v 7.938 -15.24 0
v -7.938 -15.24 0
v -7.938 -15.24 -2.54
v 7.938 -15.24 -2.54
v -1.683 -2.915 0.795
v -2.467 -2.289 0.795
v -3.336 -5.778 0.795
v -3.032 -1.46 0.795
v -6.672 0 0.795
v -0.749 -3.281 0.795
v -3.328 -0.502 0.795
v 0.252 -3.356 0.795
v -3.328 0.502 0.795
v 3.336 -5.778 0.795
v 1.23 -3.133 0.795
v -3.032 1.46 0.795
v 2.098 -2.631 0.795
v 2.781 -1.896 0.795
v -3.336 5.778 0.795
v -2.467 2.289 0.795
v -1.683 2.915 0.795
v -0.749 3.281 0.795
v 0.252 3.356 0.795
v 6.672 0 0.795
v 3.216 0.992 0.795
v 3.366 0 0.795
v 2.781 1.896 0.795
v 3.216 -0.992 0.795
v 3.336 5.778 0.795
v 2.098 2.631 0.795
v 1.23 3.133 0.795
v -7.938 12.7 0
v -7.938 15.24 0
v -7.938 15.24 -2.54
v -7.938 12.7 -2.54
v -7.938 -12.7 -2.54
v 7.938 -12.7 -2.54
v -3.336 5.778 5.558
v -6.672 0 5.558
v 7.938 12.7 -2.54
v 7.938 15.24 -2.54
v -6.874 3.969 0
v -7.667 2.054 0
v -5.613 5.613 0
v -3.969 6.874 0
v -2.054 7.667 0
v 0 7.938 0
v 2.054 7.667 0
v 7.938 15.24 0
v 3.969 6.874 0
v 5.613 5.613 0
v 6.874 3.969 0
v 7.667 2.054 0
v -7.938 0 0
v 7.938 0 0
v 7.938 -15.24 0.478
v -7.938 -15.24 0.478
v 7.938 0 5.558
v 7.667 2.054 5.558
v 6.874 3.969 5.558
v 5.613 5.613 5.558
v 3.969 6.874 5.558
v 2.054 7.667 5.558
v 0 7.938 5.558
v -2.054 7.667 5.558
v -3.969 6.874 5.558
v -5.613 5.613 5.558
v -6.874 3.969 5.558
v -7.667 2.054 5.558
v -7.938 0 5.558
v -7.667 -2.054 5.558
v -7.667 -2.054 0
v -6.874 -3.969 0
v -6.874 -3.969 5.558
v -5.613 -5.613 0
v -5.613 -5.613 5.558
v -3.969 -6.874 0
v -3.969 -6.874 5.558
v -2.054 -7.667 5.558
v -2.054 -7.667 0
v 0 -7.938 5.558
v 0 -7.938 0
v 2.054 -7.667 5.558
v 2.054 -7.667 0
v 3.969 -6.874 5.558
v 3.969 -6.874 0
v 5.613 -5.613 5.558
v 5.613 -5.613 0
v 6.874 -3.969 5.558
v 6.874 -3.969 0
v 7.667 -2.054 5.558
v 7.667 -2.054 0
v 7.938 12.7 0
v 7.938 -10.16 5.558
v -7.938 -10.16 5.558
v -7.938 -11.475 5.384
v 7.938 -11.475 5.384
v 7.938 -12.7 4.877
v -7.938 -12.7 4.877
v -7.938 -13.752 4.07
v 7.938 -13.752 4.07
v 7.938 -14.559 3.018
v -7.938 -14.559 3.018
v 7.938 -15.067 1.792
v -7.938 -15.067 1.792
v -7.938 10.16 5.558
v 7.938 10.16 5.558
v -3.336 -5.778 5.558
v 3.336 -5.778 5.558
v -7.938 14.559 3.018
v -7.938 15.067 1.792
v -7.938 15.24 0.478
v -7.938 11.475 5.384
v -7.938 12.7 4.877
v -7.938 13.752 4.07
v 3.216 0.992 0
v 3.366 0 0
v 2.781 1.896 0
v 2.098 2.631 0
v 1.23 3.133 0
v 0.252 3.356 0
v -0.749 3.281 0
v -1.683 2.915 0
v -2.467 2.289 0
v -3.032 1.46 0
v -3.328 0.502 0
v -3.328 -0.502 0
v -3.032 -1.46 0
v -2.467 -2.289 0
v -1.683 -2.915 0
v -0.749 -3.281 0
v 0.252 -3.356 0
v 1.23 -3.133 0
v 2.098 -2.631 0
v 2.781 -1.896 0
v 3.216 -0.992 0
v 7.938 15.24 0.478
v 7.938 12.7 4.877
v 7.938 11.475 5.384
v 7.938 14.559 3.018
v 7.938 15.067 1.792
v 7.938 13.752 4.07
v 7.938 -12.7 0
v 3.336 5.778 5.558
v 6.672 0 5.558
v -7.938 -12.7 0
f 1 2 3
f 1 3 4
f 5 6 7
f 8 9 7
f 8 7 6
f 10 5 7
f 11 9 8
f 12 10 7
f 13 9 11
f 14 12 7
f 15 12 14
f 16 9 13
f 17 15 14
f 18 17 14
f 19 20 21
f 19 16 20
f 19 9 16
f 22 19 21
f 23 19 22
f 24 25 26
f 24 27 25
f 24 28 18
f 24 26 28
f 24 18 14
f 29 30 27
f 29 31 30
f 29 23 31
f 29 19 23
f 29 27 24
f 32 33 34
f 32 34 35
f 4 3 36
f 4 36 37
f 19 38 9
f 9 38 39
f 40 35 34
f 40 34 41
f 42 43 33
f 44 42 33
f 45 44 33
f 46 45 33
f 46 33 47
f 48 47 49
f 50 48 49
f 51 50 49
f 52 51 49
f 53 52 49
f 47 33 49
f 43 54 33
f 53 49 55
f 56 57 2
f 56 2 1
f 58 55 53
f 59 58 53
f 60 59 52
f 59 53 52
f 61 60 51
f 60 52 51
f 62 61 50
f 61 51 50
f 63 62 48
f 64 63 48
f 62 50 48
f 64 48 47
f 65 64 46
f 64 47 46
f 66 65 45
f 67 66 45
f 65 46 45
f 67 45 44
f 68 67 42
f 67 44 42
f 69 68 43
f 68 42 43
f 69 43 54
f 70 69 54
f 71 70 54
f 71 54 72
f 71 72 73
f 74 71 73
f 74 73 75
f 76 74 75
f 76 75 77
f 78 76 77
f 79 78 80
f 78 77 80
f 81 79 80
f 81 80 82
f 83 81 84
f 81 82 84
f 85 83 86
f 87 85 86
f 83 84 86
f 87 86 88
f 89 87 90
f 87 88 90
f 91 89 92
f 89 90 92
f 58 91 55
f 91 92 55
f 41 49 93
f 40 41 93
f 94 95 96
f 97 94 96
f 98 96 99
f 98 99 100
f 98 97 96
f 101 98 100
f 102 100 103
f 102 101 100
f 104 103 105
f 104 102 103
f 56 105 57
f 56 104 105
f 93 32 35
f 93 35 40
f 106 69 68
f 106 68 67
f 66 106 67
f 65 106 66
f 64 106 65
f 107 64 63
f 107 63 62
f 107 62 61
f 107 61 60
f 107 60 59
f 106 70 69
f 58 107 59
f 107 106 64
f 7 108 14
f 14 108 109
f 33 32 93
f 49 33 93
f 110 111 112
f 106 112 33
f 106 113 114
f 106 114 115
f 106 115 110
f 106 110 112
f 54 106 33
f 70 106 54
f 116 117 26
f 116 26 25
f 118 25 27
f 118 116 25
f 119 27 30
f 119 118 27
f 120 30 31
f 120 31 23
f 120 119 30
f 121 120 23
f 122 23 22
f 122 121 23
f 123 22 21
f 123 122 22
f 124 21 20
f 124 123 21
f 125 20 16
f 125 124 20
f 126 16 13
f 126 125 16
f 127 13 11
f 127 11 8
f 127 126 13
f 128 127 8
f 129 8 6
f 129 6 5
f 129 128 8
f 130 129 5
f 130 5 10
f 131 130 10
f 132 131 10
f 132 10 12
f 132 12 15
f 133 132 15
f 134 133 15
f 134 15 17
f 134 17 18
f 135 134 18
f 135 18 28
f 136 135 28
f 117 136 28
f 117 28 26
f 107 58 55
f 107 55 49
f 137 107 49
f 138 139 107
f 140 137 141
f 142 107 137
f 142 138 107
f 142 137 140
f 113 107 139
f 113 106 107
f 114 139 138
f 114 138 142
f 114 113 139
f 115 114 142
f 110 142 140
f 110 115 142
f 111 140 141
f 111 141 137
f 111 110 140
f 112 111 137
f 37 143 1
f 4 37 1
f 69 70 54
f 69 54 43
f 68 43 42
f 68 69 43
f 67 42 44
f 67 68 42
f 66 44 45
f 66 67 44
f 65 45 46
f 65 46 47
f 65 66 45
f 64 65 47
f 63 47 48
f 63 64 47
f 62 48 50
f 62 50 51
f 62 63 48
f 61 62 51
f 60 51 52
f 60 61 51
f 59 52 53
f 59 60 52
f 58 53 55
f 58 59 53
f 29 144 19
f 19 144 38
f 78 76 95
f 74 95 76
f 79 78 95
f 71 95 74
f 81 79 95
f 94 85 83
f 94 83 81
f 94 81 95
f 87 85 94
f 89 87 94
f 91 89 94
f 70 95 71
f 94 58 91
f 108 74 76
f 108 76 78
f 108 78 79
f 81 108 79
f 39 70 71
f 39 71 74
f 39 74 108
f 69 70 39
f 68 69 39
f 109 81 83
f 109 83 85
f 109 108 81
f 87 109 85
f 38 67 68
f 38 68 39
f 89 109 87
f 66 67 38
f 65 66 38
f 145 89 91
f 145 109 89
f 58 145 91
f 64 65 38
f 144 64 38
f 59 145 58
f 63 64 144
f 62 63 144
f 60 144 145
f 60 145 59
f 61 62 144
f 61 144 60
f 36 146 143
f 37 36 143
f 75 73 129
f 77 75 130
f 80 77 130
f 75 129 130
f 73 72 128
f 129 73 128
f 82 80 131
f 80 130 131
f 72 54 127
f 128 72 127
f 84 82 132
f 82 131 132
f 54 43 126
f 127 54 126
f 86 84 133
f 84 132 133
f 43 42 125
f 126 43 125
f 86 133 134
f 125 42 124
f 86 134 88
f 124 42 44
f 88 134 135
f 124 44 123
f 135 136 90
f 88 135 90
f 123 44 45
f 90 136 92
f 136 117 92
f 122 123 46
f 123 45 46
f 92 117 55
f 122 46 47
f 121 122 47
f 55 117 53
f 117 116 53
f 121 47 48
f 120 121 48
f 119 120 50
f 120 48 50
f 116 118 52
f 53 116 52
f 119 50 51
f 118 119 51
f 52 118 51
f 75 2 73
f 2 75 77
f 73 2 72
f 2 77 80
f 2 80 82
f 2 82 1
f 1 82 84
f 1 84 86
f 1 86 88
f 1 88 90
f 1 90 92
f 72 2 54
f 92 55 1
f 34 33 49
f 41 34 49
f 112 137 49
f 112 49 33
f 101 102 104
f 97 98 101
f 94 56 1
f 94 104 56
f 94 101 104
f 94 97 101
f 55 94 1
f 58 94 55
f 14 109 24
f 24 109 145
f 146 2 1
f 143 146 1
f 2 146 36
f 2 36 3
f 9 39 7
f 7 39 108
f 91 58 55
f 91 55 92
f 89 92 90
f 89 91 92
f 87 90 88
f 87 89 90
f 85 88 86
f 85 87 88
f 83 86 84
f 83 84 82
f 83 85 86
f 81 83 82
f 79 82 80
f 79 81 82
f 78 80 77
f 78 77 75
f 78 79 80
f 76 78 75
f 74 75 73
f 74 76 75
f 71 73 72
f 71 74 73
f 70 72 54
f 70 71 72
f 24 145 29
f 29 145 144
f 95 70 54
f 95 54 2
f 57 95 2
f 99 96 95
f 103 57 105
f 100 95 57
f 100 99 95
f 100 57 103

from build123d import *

# Parameters (mm, degrees)
F0_R     = 7.9375
F0_R_2   = 3.3655
F1_DEPTH = 5.55752
F2_R     = 3.3655
F3_DEPTH = 4.7625
F5_DEPTH = 5.55752
F6_W     = 15.875
F6_H     = 2.54
F7_W     = 15.875
F7_H     = 2.54
F8_DEPTH = 2.54
F9_R     = 5.08


with BuildPart() as f1:
    # F0 (on Top) → F1 (new body)
    with BuildSketch(Plane.XY):
        Circle(F0_R)
        Circle(F0_R_2, mode=Mode.SUBTRACT)
    extrude(amount=F1_DEPTH)

    # F2 (on face) → F3 (cut)
    with BuildSketch(Plane.XY.offset(5.55752)):
        Polygon((-3.336219, 5.7785), (-6.672437, 0), (-3.336219, -5.7785), (3.336219, -5.7785), (6.672437, 0), (3.336219, 5.7785), align=None)
        Circle(F2_R, mode=Mode.SUBTRACT)
    extrude(amount=-F3_DEPTH, mode=Mode.SUBTRACT)


with BuildPart() as f5:
    # F4 (on face) → F5 (new body)
    with BuildSketch(Plane.XY.offset(5.55752)):
        with BuildLine():
            Line((7.9375, 15.24), (-7.9375, 15.24))
            Line((-7.9375, 15.24), (-7.9375, 0))
            ThreePointArc((-7.9375, 0), (0, 7.9375), (7.9375, 0))
            Line((7.9375, 0), (7.9375, 15.24))
        make_face()
        with BuildLine():
            ThreePointArc((7.9375, 0), (0, -7.9375), (-7.9375, 0))
            Line((-7.9375, 0), (-7.9375, -15.24))
            Line((-7.9375, -15.24), (7.9375, -15.24))
            Line((7.9375, -15.24), (7.9375, 0))
        make_face()
    extrude(amount=-F5_DEPTH)

    # F9
    f9_edges = [f5.edges().sort_by_distance(p)[0] for p in [
        (0, -15.24, 5.55752),
        (0, 15.24, 5.55752),
    ]]
    fillet(f9_edges, radius=F9_R)


with BuildPart() as f8:
    # F6 (on face) + F7 (on face) → F8 (new body)
    with BuildSketch(Plane(origin=(0, 0, 0), x_dir=(1, 0, 0), z_dir=(0, 0, -1))):
        with Locations((0, 13.97)):
            Rectangle(F6_W, F6_H)
    with BuildSketch(Plane(origin=(0, 0, 0), x_dir=(1, 0, 0), z_dir=(0, 0, -1))):
        with Locations((0, -13.97)):
            Rectangle(F7_W, F7_H)
    extrude(amount=F8_DEPTH)


solid = Compound([f1.part, f5.part, f8.part])
